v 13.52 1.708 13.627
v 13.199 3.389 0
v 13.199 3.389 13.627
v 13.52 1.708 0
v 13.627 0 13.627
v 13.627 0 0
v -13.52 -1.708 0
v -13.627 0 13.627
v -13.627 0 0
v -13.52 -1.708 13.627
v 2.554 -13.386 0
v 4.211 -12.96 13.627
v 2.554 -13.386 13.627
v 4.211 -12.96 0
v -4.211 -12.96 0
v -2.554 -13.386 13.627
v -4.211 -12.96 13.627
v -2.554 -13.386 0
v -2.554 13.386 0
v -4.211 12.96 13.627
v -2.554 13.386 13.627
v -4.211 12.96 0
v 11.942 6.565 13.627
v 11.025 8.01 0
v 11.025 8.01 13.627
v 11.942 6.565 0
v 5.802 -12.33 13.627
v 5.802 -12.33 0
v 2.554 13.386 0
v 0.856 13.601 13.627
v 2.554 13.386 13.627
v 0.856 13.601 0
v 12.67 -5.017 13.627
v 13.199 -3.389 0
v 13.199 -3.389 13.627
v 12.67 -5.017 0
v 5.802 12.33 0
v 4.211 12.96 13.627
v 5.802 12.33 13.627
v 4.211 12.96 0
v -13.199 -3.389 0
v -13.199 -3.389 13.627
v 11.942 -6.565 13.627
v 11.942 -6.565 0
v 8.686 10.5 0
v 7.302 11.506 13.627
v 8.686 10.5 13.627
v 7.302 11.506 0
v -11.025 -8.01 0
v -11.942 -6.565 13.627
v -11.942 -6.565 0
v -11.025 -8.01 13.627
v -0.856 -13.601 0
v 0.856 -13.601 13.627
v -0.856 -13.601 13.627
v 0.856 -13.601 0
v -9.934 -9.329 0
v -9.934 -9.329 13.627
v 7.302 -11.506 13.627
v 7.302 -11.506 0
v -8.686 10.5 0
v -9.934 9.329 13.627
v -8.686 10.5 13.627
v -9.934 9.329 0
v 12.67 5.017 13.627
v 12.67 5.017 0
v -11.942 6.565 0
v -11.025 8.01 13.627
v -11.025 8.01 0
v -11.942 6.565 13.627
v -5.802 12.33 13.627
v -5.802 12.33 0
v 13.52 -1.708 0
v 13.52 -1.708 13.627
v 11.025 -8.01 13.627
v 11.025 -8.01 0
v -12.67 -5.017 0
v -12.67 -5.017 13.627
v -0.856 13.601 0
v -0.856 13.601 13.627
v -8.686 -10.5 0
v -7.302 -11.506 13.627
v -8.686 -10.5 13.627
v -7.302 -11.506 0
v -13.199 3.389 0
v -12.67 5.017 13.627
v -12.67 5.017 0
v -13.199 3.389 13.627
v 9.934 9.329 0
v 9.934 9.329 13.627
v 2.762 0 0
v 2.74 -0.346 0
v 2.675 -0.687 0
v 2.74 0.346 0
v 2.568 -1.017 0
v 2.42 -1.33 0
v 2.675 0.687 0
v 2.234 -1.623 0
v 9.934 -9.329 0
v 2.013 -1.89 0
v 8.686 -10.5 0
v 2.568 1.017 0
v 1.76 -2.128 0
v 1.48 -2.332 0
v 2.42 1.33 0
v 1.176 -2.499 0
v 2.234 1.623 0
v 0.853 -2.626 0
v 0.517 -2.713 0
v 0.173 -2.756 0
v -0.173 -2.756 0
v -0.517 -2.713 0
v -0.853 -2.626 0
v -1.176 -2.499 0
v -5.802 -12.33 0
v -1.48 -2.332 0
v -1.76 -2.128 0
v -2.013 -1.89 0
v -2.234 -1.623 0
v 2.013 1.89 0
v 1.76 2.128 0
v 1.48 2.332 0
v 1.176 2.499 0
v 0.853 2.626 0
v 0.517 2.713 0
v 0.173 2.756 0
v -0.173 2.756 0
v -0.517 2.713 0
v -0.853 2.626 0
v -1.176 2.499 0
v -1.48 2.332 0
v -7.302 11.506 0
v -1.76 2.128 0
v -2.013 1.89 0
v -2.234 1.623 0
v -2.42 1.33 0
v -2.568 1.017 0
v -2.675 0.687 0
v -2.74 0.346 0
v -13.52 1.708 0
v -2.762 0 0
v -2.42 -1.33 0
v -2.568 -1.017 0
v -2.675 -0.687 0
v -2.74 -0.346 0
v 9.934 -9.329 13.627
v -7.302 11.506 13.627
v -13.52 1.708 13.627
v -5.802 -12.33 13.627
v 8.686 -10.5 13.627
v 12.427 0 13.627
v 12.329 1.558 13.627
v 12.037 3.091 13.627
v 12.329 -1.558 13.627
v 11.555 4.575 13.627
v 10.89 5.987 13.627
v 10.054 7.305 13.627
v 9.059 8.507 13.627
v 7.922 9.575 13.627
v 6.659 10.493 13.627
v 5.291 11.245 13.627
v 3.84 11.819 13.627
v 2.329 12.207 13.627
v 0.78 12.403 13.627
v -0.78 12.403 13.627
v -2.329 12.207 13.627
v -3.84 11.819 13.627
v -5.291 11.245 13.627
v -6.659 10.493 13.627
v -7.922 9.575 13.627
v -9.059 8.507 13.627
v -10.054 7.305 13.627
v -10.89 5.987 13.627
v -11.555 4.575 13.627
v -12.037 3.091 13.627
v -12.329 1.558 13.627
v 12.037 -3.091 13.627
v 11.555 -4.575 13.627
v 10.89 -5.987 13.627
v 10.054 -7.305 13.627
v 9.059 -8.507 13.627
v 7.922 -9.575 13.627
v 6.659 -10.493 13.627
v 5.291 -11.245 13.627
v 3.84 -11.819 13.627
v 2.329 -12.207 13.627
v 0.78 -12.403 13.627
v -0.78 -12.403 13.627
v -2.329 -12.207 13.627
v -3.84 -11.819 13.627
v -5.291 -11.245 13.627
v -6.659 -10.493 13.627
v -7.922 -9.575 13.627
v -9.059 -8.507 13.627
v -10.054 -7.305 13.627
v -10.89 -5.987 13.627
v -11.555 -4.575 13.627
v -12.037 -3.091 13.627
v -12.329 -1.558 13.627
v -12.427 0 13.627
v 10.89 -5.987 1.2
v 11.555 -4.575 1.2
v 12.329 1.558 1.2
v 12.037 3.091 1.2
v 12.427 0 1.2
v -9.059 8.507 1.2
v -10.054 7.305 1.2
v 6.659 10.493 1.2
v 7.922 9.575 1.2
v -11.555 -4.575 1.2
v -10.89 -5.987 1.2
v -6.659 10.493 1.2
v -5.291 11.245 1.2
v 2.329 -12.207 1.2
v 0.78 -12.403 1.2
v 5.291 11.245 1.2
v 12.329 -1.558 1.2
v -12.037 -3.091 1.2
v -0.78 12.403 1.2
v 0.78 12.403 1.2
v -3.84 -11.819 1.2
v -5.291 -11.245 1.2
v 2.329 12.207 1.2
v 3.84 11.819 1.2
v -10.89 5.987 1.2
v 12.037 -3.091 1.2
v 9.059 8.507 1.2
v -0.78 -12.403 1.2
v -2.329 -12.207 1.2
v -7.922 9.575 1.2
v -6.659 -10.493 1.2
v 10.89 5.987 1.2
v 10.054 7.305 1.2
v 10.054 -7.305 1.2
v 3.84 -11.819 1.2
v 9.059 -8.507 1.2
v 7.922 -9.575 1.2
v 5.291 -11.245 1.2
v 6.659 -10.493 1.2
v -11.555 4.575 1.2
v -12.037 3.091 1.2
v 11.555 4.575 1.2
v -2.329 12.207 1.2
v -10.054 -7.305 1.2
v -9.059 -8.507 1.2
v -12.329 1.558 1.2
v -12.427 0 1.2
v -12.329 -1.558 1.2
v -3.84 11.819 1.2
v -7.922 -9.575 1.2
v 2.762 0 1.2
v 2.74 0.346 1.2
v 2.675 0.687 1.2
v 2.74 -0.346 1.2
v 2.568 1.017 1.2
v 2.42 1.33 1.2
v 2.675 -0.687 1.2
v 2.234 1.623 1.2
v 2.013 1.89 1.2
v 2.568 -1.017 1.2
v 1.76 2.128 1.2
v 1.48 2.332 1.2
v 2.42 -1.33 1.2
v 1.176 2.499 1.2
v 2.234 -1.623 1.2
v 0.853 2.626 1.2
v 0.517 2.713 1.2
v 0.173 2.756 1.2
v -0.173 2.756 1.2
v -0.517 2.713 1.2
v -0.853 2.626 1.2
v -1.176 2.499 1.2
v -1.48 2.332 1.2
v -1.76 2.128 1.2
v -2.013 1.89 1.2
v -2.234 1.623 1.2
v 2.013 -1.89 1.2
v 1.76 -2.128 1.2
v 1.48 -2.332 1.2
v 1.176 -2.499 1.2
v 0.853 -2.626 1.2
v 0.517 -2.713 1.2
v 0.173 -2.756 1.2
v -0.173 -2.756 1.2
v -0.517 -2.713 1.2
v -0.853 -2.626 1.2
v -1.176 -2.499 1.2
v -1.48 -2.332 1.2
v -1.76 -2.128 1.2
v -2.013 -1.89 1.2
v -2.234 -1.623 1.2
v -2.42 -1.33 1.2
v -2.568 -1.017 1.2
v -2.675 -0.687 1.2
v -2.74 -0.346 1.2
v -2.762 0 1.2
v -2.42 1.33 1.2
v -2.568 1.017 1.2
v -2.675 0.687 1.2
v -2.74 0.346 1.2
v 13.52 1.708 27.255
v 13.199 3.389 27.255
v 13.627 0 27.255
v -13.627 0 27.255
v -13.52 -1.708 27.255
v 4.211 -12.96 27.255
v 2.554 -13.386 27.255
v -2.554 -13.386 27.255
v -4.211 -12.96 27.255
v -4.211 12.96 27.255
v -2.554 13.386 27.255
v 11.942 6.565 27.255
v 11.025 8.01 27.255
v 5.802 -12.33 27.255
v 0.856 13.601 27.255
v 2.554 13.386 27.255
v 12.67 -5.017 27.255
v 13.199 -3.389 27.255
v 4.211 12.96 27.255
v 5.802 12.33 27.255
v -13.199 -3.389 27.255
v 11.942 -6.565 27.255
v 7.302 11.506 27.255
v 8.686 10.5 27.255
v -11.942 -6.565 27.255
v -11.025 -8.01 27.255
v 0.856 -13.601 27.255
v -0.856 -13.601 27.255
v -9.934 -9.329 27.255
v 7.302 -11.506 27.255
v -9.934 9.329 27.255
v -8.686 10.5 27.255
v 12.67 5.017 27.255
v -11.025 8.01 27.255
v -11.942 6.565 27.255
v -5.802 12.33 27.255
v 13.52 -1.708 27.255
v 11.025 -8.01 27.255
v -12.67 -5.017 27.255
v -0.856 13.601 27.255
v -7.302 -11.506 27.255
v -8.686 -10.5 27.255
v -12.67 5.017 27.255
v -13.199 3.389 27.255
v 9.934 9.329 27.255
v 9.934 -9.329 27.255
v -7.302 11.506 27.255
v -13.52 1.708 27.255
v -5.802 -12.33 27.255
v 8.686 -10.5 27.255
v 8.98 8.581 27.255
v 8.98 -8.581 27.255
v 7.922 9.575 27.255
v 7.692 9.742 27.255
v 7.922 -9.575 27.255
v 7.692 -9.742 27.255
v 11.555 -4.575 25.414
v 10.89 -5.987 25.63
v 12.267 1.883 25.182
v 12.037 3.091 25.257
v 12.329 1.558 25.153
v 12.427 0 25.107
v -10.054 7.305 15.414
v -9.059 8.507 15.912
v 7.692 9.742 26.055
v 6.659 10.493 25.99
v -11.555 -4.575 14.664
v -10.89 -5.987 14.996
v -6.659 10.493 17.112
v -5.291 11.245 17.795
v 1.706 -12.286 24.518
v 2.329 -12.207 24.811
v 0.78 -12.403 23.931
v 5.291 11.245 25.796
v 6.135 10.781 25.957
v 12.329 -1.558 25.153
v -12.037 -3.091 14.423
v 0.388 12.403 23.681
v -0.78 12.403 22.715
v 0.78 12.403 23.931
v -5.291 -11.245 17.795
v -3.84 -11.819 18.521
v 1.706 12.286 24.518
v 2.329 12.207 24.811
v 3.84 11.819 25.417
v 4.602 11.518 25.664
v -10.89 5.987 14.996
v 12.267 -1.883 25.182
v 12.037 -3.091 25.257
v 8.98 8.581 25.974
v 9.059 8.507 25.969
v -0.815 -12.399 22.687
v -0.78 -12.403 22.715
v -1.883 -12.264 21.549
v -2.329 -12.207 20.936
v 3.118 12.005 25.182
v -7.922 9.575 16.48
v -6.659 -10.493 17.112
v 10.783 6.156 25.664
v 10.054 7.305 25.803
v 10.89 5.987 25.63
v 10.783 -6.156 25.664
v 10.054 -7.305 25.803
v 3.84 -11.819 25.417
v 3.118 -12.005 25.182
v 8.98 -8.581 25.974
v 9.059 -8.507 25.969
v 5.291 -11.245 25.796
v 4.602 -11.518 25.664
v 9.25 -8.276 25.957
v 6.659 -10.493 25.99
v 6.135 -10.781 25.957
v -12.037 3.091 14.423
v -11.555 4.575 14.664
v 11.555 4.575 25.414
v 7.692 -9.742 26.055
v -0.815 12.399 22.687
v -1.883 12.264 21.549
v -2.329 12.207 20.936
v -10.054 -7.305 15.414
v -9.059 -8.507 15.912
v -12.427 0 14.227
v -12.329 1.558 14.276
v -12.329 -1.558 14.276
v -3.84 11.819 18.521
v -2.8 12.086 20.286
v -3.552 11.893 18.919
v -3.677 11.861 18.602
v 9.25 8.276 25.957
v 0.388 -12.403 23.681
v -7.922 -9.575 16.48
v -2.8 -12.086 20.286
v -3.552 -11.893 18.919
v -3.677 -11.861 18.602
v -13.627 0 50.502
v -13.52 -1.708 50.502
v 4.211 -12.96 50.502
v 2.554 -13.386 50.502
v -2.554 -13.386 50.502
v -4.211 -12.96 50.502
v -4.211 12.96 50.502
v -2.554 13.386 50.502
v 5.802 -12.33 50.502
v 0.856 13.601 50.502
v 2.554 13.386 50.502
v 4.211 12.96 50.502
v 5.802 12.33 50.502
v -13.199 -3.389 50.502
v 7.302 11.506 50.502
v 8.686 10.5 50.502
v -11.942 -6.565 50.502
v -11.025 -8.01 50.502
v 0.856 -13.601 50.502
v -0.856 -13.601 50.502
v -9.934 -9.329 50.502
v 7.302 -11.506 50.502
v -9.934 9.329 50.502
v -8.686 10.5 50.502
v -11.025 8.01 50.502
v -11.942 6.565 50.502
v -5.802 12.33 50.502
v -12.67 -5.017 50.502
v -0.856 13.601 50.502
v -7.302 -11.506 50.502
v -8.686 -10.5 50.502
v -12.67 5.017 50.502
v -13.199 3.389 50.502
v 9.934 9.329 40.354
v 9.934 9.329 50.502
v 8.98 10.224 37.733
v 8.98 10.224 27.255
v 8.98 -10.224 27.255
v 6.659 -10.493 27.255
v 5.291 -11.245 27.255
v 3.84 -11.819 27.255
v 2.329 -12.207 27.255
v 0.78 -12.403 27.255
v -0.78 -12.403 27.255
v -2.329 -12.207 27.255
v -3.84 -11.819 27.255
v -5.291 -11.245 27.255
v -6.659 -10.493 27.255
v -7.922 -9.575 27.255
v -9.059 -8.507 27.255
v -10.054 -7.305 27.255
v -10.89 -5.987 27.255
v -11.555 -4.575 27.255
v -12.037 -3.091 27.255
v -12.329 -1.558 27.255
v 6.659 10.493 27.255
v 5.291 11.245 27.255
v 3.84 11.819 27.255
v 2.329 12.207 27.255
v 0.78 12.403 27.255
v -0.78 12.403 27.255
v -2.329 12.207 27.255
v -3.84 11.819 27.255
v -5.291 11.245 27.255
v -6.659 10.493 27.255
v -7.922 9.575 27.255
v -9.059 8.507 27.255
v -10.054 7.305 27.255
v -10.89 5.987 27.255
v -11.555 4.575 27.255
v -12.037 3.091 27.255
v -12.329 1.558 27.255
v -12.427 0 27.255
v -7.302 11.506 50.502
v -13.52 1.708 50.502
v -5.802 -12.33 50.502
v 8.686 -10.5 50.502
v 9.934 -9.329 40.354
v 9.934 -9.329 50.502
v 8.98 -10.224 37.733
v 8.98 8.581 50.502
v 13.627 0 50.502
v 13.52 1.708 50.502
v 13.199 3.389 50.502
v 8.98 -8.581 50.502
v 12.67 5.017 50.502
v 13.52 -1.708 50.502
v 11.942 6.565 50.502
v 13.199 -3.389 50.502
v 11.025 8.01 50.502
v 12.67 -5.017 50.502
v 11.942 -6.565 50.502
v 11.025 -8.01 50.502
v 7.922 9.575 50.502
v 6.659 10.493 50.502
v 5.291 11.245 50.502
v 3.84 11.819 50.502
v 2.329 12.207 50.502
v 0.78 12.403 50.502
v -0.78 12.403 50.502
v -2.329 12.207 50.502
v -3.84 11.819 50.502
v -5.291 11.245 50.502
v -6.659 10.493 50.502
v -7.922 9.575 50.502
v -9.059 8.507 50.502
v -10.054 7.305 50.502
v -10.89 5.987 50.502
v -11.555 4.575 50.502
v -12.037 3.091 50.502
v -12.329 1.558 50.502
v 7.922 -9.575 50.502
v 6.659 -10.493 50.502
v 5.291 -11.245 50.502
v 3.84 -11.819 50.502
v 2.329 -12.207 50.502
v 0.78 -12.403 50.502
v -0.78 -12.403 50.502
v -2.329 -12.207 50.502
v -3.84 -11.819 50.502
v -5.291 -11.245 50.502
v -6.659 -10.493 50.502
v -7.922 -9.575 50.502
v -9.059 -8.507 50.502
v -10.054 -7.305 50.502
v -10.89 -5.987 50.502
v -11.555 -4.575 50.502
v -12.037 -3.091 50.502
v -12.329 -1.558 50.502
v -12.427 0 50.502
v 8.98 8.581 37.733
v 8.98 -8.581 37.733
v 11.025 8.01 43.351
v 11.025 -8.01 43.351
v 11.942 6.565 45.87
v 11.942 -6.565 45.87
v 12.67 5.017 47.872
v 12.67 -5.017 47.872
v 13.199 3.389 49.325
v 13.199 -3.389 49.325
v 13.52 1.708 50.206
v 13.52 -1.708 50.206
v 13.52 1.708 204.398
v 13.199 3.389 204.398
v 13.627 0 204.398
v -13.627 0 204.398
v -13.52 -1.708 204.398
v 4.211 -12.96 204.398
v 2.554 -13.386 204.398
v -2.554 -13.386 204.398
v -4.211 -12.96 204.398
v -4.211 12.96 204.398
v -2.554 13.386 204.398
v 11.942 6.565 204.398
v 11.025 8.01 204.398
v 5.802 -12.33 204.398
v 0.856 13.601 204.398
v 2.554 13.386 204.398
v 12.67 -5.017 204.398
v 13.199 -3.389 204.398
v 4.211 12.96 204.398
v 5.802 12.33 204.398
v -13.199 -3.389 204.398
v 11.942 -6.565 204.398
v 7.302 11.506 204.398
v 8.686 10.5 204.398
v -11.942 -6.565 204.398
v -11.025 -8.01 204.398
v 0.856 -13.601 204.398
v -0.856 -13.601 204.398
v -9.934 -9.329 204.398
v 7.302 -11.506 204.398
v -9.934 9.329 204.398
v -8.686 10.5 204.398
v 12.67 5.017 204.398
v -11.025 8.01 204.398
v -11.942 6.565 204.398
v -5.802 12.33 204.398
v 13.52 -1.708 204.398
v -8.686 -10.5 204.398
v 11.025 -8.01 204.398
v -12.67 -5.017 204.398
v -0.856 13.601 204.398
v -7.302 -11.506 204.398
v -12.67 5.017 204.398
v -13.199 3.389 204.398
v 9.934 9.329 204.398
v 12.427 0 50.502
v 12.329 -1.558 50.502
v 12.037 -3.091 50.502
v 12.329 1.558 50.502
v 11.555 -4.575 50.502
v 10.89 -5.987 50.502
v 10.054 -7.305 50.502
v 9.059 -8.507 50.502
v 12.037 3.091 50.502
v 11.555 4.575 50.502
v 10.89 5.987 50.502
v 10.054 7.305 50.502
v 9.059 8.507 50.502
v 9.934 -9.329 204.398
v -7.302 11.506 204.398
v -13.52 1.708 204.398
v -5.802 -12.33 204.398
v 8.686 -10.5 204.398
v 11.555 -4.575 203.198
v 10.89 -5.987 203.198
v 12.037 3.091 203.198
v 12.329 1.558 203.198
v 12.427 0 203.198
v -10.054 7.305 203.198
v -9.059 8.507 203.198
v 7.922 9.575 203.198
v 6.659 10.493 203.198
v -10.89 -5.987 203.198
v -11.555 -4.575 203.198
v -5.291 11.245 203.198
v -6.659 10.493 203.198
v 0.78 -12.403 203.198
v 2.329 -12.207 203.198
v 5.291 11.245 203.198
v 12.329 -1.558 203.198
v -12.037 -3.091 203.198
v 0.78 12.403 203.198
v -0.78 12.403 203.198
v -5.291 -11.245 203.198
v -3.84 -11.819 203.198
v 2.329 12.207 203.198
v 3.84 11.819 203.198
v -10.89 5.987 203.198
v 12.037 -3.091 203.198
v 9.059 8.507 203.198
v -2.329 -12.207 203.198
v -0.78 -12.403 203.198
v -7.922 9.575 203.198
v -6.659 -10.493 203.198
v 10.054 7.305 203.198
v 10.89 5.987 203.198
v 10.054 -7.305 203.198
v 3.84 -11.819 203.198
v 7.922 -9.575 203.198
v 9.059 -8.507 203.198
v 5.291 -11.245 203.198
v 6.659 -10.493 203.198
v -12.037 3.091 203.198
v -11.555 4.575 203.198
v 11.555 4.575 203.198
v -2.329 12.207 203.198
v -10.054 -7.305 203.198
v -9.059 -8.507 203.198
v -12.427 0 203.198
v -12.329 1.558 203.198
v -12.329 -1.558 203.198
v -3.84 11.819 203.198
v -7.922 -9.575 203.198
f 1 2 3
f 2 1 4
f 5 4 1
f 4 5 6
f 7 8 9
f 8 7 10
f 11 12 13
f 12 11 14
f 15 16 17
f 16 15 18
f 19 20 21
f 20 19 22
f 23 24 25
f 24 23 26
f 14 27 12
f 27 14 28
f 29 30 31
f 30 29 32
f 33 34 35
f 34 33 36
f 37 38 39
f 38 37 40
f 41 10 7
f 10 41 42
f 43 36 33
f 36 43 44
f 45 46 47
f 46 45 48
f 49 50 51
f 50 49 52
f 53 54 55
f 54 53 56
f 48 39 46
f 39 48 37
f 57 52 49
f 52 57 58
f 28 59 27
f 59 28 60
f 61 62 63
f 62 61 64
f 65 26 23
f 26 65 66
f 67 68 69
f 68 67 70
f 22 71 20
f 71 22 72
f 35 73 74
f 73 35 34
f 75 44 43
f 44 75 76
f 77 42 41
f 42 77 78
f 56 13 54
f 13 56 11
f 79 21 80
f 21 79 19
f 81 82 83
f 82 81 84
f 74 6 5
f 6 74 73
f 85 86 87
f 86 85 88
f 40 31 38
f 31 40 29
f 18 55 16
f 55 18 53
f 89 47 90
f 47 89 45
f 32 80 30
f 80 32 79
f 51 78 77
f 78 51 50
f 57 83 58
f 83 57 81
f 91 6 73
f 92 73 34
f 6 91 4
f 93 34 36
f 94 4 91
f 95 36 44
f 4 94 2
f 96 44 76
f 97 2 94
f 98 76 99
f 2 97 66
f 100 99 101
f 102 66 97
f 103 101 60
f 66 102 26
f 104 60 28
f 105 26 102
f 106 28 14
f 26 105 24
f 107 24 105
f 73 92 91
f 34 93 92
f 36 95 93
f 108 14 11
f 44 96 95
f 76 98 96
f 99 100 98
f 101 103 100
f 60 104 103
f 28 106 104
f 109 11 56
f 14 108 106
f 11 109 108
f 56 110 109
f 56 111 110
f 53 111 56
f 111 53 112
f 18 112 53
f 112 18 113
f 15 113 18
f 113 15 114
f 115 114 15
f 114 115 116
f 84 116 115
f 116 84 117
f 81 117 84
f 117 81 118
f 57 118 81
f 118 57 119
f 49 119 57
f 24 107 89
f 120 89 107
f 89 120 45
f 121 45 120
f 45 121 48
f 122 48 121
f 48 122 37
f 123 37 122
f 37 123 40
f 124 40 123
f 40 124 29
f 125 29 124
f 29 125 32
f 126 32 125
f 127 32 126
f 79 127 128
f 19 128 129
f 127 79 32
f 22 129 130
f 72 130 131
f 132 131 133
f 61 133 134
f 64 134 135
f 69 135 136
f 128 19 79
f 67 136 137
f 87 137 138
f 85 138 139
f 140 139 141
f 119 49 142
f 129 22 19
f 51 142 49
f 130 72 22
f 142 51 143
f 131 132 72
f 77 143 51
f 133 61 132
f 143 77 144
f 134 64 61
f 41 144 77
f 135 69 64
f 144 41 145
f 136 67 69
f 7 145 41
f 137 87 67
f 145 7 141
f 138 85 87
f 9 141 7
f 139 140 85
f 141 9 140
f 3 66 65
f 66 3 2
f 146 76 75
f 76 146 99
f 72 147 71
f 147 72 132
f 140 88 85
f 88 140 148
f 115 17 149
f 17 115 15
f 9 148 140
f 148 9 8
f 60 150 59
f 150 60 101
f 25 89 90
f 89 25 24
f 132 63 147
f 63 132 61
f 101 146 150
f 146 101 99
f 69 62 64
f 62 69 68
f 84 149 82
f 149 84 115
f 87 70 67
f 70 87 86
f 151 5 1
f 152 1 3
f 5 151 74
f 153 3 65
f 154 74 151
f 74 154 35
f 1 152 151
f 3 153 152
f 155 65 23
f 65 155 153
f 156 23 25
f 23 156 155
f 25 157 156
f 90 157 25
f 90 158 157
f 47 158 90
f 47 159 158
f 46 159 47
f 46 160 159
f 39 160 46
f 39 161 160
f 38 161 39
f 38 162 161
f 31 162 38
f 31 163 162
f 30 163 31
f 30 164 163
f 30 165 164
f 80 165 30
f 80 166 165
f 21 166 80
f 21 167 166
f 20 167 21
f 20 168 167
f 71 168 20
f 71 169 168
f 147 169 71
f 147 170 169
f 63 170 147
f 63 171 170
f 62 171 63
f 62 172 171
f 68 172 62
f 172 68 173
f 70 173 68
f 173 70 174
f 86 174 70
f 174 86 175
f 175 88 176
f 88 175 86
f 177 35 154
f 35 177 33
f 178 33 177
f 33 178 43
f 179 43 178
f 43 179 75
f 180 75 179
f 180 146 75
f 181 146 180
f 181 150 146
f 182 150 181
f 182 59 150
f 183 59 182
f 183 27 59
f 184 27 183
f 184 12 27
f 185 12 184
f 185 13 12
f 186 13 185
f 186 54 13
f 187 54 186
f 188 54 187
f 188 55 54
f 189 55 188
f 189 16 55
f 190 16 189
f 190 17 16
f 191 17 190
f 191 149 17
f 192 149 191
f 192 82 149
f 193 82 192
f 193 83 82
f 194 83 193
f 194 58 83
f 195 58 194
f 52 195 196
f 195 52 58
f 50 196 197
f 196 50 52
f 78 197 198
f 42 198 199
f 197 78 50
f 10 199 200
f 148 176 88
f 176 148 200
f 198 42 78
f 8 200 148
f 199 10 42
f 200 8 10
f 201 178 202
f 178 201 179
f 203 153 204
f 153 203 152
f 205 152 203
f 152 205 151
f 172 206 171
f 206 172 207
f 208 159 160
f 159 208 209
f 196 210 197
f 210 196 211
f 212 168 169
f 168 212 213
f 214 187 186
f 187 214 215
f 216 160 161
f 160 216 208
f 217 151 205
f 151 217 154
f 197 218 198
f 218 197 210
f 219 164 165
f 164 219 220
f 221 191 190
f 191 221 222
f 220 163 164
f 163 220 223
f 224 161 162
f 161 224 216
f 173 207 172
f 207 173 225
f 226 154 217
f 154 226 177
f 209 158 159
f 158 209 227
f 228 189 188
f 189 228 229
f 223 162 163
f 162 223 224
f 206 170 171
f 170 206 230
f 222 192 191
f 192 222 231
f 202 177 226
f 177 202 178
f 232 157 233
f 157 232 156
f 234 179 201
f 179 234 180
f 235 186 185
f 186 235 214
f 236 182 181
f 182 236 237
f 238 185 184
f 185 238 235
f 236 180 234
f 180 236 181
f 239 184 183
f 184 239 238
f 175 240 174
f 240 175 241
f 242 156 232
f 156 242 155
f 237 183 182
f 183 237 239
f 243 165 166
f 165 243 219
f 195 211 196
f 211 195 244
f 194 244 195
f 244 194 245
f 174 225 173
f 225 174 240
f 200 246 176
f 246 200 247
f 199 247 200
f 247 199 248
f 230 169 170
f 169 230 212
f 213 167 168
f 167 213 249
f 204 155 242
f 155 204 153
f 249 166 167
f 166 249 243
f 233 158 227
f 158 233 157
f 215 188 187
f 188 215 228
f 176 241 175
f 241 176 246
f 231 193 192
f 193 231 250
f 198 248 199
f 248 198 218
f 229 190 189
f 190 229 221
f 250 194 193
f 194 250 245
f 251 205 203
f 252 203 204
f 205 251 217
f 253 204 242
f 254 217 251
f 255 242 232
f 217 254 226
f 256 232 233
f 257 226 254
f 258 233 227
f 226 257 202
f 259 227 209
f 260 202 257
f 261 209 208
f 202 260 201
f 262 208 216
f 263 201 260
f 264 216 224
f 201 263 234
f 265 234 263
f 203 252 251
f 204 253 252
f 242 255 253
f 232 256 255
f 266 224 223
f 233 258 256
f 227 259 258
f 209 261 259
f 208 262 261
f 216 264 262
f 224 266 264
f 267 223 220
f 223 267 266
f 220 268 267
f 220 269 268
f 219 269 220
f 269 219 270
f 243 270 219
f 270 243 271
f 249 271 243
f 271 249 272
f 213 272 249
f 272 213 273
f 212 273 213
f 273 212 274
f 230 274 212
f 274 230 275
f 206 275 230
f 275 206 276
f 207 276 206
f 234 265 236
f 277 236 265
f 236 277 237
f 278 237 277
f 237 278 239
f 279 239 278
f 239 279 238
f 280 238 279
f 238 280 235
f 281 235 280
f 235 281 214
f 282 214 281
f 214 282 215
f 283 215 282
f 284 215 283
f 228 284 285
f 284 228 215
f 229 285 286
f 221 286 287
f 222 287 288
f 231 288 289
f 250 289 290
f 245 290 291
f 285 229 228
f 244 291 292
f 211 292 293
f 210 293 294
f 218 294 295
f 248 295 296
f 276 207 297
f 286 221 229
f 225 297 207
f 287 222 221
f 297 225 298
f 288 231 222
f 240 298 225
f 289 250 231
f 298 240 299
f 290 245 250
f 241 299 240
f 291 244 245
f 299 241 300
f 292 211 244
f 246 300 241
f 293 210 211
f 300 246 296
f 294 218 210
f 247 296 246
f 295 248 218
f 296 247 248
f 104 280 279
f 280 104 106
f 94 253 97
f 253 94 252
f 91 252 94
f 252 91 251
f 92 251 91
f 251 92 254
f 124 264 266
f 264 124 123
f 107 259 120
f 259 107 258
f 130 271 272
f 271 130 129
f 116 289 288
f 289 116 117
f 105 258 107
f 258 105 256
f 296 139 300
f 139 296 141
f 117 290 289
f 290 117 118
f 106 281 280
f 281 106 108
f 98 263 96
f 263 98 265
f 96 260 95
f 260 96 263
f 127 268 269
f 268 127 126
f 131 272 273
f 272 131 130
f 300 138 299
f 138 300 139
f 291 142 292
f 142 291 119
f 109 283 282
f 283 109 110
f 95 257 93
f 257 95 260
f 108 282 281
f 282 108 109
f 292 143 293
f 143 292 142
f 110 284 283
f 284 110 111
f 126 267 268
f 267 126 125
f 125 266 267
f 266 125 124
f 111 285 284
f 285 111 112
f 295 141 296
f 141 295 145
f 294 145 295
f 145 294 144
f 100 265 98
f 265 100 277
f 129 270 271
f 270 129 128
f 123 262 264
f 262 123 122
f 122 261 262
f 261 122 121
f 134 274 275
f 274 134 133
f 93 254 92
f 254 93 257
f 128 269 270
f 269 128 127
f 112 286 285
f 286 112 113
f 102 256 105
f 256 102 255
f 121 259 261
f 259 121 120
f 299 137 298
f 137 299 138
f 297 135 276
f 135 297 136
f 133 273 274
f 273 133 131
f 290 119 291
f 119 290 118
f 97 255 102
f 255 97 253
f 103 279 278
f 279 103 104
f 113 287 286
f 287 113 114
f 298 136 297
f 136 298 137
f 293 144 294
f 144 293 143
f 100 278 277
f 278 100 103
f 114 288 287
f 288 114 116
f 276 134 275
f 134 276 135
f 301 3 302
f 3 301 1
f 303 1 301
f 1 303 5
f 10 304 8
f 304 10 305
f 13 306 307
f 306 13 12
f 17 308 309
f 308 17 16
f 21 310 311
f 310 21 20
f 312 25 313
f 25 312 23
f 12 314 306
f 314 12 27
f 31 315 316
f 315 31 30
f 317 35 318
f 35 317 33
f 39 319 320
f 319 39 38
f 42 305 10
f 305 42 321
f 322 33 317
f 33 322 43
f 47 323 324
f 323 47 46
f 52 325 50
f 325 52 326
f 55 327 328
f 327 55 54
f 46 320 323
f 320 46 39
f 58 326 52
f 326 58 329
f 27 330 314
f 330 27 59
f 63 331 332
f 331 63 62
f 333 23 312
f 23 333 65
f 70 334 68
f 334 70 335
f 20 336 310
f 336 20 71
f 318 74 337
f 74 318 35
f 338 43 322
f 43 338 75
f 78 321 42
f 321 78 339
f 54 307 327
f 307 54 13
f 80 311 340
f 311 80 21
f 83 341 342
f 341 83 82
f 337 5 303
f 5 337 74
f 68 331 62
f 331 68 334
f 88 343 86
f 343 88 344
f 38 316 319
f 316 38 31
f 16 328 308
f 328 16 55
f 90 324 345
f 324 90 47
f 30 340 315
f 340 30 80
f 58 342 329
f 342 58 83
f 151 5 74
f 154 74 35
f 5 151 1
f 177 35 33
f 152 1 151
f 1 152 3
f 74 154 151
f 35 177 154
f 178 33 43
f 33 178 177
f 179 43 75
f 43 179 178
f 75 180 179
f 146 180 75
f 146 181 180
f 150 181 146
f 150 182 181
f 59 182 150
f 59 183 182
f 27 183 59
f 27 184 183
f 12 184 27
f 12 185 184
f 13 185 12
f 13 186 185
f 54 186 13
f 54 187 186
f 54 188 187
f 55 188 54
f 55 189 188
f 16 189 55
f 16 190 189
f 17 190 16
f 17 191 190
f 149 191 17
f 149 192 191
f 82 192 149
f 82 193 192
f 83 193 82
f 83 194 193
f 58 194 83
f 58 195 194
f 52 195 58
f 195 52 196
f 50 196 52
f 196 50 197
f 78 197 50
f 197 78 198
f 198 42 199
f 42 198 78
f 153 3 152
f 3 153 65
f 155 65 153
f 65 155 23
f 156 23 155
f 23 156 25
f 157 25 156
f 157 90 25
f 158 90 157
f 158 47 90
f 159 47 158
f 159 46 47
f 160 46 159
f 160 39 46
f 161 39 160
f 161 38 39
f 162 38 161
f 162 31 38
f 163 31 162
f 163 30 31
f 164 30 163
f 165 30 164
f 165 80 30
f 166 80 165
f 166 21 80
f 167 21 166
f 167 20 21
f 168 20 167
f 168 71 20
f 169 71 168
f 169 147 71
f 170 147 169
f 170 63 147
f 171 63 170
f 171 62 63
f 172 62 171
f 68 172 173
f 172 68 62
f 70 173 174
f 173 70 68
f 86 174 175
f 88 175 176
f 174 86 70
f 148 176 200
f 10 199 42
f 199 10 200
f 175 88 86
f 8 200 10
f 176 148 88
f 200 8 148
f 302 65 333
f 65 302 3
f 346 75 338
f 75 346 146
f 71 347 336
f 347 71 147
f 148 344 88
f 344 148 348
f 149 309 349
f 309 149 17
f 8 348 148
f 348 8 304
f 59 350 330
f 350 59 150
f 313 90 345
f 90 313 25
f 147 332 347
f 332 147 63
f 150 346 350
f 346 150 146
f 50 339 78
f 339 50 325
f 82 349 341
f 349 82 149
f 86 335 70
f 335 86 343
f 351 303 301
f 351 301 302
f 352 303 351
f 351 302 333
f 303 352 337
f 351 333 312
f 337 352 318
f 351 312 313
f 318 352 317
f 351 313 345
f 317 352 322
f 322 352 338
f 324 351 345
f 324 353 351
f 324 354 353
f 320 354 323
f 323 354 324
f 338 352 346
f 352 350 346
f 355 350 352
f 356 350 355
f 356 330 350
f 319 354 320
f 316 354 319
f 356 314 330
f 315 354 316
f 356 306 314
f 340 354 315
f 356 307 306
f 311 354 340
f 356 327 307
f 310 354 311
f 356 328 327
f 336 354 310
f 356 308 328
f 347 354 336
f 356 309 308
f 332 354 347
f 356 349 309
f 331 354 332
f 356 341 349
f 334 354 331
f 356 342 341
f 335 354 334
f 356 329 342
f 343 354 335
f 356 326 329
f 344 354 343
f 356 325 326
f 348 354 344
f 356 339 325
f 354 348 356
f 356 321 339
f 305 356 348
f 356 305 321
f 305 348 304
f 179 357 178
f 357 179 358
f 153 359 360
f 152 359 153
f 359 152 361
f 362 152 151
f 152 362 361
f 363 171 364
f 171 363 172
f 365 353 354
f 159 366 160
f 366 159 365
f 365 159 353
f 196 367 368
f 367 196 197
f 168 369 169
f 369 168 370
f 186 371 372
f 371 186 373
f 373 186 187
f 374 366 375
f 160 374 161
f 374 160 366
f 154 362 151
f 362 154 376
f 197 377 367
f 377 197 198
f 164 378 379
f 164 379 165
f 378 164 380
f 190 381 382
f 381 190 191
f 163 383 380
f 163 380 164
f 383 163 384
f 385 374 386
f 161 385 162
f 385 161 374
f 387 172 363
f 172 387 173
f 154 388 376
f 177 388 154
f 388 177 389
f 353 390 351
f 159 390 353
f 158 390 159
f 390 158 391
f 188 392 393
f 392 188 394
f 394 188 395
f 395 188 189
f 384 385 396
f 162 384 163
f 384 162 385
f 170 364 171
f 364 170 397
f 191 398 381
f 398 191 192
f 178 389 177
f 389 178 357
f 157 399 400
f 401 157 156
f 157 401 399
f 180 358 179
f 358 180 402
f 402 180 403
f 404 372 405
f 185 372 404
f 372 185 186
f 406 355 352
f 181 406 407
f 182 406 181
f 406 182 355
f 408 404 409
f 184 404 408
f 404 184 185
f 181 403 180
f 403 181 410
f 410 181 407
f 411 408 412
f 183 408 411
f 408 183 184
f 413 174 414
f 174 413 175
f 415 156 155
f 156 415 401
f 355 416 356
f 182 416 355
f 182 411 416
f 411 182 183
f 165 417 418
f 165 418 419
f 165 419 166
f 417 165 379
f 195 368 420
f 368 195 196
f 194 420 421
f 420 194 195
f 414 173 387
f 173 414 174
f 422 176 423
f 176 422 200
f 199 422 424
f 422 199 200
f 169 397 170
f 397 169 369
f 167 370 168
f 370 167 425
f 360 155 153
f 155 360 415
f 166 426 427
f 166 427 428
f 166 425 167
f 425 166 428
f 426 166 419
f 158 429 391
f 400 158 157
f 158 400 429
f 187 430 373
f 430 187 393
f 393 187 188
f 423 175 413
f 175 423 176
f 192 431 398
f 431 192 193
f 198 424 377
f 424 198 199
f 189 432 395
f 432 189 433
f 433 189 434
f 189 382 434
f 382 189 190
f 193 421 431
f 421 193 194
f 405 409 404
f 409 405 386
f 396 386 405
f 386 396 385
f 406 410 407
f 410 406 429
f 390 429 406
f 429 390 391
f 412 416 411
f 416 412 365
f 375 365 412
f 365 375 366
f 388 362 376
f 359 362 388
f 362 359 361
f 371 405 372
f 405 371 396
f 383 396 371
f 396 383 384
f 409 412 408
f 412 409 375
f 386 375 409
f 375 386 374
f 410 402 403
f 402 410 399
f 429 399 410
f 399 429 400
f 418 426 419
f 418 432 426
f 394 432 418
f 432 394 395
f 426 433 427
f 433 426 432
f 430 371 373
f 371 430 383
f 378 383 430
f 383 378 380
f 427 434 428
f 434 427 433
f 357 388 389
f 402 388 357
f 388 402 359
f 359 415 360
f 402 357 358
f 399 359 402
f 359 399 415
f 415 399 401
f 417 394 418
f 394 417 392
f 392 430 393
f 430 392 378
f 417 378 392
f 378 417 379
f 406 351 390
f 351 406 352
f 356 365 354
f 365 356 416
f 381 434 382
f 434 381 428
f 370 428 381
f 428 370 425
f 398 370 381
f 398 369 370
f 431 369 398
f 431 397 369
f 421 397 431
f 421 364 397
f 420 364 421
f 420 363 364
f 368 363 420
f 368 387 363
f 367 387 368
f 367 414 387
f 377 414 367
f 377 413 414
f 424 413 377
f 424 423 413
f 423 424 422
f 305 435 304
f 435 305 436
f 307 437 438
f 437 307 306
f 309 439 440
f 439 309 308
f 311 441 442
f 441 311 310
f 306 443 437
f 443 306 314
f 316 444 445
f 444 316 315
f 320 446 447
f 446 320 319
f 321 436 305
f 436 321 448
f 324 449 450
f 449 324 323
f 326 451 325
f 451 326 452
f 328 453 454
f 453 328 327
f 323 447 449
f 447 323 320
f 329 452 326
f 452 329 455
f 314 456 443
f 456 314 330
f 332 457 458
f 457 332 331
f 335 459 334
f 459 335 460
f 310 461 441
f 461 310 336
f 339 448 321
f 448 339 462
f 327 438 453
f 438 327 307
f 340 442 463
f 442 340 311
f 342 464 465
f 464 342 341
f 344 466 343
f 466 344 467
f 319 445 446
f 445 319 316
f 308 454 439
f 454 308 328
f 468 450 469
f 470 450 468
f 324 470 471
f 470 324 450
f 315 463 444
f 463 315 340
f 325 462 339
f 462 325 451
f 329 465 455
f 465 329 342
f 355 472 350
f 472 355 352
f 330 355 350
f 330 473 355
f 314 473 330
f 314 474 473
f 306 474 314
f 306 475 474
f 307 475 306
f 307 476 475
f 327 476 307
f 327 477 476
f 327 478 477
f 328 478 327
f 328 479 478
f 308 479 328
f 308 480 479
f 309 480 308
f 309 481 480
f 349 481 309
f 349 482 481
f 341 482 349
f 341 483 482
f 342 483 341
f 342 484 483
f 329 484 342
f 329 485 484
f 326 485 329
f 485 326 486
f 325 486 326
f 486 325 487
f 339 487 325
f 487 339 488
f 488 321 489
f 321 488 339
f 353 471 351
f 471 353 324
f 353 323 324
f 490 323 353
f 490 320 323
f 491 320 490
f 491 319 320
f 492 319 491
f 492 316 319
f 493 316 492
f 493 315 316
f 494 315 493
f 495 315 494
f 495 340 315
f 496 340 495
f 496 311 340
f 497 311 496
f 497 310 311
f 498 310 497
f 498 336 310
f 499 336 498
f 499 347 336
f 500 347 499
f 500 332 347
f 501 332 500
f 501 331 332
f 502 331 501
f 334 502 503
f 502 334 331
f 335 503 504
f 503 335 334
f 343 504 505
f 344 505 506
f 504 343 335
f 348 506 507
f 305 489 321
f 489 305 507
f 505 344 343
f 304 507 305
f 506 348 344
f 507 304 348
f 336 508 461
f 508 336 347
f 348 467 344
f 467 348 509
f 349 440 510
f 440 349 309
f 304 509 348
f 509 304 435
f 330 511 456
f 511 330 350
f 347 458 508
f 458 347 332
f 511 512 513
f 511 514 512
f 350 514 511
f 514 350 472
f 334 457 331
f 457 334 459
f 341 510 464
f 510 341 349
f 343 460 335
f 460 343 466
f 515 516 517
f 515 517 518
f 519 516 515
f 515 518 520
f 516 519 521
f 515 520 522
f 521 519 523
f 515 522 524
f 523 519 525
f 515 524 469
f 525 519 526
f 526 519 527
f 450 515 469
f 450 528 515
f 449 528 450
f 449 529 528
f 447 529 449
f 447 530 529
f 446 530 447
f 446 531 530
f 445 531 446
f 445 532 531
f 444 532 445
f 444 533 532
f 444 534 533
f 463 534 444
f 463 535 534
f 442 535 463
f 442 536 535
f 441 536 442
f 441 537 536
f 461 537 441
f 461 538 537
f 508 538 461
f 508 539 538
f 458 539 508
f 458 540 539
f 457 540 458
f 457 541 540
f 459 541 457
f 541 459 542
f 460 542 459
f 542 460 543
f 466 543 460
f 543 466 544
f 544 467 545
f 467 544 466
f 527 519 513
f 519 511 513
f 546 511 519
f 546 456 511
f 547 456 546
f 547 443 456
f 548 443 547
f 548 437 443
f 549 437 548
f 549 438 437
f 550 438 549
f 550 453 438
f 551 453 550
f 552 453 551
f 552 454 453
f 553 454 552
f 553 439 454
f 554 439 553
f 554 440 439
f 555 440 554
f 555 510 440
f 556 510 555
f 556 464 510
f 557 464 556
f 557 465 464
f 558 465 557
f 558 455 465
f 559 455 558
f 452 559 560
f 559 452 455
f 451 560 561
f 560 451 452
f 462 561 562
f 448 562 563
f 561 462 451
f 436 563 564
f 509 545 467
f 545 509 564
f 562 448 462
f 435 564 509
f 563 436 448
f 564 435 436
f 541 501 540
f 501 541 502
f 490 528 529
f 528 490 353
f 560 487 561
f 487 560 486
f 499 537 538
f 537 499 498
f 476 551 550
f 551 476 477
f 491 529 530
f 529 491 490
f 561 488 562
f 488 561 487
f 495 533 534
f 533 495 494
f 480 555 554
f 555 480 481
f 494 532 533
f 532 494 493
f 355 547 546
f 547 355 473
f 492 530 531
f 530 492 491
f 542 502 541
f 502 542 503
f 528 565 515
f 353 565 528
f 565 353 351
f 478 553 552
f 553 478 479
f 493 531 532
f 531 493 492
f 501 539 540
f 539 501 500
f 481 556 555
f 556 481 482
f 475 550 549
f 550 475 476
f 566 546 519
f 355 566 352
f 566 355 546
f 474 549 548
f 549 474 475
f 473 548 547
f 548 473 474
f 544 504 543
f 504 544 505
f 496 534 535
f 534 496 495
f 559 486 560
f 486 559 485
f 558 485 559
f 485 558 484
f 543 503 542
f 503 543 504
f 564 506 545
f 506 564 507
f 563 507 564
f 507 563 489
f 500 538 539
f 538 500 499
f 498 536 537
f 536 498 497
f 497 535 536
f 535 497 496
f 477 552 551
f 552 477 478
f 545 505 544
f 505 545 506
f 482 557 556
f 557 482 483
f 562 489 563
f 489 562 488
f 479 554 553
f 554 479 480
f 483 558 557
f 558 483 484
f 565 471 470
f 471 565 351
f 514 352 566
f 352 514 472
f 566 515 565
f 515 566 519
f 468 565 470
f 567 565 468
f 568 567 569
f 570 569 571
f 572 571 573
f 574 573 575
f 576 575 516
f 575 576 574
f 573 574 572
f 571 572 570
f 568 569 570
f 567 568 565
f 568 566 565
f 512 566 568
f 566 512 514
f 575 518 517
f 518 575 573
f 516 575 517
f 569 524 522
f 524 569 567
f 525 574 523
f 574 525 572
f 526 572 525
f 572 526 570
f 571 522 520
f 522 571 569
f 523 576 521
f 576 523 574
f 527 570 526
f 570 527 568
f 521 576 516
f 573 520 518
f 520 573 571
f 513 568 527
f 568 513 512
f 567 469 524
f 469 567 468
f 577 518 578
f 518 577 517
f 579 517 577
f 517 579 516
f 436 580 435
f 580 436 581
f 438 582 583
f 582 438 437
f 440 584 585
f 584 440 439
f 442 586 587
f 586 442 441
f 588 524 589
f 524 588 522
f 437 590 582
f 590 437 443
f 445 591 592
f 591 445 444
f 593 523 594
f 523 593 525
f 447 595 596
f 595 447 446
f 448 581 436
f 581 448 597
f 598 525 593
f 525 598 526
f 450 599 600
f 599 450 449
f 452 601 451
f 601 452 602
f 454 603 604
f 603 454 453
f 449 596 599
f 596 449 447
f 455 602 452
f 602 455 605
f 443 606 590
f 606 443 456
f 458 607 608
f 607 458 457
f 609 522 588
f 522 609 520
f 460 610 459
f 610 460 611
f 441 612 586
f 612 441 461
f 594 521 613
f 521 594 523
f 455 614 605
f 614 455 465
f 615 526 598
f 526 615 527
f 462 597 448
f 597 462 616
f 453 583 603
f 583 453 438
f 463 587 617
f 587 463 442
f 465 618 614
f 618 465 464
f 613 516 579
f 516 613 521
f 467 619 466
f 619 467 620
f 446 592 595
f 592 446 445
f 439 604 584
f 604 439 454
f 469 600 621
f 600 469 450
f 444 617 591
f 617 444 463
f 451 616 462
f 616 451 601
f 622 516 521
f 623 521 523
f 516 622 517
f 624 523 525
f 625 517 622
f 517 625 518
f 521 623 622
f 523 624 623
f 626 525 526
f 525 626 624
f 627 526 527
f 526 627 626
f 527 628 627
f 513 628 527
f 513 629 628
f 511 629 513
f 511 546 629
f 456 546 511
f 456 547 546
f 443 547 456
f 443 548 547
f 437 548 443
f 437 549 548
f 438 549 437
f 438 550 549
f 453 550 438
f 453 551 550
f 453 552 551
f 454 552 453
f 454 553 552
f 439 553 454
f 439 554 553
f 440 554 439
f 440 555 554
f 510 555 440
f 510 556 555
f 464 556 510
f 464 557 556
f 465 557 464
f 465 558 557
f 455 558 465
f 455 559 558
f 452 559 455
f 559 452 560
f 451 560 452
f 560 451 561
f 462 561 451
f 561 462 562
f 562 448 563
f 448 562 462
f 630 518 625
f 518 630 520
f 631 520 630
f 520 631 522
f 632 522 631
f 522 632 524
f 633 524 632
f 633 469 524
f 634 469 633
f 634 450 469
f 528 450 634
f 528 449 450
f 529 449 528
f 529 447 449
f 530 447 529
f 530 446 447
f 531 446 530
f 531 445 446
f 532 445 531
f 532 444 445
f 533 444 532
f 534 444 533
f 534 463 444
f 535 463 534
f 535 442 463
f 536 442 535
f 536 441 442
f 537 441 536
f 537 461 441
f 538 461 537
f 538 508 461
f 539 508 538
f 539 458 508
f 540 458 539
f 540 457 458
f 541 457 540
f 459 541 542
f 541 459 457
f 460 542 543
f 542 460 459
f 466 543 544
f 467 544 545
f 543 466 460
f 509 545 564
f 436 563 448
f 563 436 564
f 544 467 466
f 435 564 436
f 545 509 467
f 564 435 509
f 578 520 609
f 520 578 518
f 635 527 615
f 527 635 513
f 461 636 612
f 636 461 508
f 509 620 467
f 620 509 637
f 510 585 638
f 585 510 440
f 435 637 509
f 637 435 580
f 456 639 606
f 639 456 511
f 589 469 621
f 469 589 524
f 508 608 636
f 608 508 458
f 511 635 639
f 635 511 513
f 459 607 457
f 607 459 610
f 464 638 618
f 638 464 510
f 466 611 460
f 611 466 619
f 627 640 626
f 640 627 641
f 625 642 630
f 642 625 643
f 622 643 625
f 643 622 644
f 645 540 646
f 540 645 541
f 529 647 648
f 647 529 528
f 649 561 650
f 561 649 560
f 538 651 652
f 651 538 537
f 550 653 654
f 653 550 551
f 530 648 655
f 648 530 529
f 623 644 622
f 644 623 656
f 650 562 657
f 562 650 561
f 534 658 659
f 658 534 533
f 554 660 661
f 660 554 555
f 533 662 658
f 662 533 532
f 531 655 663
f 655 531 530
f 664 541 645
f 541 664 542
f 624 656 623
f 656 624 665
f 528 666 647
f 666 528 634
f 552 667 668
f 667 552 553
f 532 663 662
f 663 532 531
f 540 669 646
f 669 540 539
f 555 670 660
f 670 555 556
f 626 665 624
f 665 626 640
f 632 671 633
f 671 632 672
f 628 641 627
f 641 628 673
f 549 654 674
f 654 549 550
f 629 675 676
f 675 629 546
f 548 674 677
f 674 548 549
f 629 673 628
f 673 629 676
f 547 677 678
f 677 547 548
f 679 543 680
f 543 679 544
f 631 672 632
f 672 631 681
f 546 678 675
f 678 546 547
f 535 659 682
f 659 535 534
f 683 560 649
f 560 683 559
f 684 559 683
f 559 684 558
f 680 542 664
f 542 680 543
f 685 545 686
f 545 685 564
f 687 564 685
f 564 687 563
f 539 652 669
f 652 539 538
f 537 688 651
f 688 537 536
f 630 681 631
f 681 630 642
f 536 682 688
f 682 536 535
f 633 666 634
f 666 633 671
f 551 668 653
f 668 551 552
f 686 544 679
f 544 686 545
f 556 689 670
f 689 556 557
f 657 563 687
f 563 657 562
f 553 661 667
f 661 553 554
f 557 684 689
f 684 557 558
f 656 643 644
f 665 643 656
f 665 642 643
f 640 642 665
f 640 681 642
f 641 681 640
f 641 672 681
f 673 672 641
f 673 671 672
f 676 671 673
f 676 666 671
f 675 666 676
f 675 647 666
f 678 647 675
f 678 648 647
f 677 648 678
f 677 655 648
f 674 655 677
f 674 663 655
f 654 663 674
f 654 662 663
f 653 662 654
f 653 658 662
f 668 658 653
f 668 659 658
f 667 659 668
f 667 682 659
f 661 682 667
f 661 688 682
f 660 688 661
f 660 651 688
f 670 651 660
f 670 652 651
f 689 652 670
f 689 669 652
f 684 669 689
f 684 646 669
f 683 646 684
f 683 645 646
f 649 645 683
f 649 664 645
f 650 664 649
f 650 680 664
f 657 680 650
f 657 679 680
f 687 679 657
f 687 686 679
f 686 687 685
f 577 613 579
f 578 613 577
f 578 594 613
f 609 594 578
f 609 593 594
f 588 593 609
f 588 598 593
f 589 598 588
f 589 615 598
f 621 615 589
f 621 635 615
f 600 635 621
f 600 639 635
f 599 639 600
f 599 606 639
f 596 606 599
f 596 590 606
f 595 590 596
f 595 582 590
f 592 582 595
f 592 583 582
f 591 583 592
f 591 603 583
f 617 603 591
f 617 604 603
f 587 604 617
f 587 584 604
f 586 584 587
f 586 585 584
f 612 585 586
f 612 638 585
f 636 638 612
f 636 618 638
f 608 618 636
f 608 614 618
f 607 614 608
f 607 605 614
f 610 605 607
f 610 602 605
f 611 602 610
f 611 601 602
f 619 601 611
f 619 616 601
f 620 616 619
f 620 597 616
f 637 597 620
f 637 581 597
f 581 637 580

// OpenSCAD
//Parameters

//All dimensions in mm
//Frequency is in Hz
//Assuming pressure of 2 in. H20


f = 440;
scaling_formula= 25.4*(56.5924582042675*pow(f,-0.666621066467016)); //Scaling formula for Bourdon pipes

Pressure = 2; //inches of water, pressure
Cap = 1; //1=yes, 2=no




//Intermediate variables



ID = scaling_formula;
echo(ID);


Lip_angle = 20;

IW = (3.14159*ID)/4;

Wall_thickness = 1.2;

//Formula for PL based on Liljencrants numbers
Pipe_length= Cap*((86004.4/f)-IW);

//Formula for MH based on Giangiulio's equation
openMHformula = 550/(pow(2,(ln (f))));
closedMHformula = pow((3.018-(0.233*(ln (f)))),5);

Mouth_height = (Cap-1)*(openMHformula)+(-1*(Cap-2))*(closedMHformula);

//Formula for WST based on Ising's #
WST = 25.4*(((4.8*(pow(f,2))*(pow(Mouth_height/25.4,3)))/Pressure)*1.554*pow(10,-6));

echo(WST);
echo(Mouth_height);

Foot_hole_radius = ID/9;
Foot_wall = Wall_thickness;


OD = ID+(2*Wall_thickness);
SU = OD/2;  //SU is standard arbitrary unit equal to outer radius


prism_width = OD;

windsheet_displacement = sqrt(((ID*ID)-(IW*IW))/4);

prism_thickness = SU-(WST+windsheet_displacement);

prism_height = (prism_thickness*sin(90-Lip_angle))/(sin(Lip_angle))  ;

Mouth_cylinder_height = prism_height+Mouth_height;

resonator_length = Pipe_length - Mouth_cylinder_height;


foot_vert_disp = 0;
collar_vert_disp = SU;
languid_vert_disp = SU;
mouth_vert_disp = 2*SU;
resonator_vert_disp = 2*SU + Mouth_cylinder_height;
cap_vert_disp = resonator_vert_disp + resonator_length;

languid_thickness = Wall_thickness ;







//Prism module
 module prism(l, w, h){
       polyhedron(
               points=[[0,0,0], [l,0,0], [l,w,0], [0,w,0], [0,w,h], [l,w,h]],
               faces=[[0,1,2,3],[5,4,3,2],[0,4,5,1],[0,3,4],[5,2,1]]
               );
       
       }





//foot of pipe
difference(){
    cylinder(h=SU, r1=SU, r2=SU, center=false,$fn=50);
    cylinder(h=SU,r1=SU-Wall_thickness,r2=SU-Wall_thickness, center=false,$fn=50);
}

//Hole in foot of pipe
difference(){
    cylinder(h=Wall_thickness, r1=SU, r2=SU, center = false, $fn=50);
    cylinder(h=Wall_thickness*2,r1=Foot_hole_radius, r2= Foot_hole_radius, center = false, $fn=50);
}

//wall above foot
translate ([0,0,collar_vert_disp])
    difference(){
        cylinder(h=SU,r1=SU,r2=SU, center =false,$fn=50);
        cylinder(h=SU, r1=SU-Wall_thickness, r2=SU-Wall_thickness,center=false,$fn=50);
    }

//languid
translate([0,0,languid_vert_disp]){
    difference(){
        difference(){   
            difference(){

                cylinder (h=SU,r1=SU,r2=SU,center=false,$fn=50);
                
                rotate ([270,270,0]){
                    translate ([0,windsheet_displacement,0])
                        cylinder (h=2*SU,r1=SU-languid_thickness,r2=SU-languid_thickness,center=true,$fn=50);
                }
            }
            
            translate ([windsheet_displacement,-SU,0])
                cube ([WST,2*SU,SU]);
        }
        
        rotate([270,0,90]){
            translate([-SU,-SU/2,0])
                prism(SU*2,SU/2,SU);
        }
    }
}

//Mouth
translate([0,0,mouth_vert_disp]){
    difference(){
        difference(){
            cylinder(h=Mouth_cylinder_height, r1=SU, r2=SU, center=false,$fn=50);
            cylinder(h=Mouth_cylinder_height,r1=SU-Wall_thickness,r2=SU-Wall_thickness, center=false,$fn=50);
        }
        
       translate([windsheet_displacement+WST,-SU,0])
            cube([SU,SU*2,Mouth_cylinder_height]);
    }
    intersection(){
        translate([windsheet_displacement+WST,-SU,Mouth_height])
            rotate([90,0,90])
                prism(prism_width,prism_height,prism_thickness);
        
        cylinder(h=SU*12,r1=SU,r2=SU, center = false,$fn=50);
        
        }
        
}



//Resonant length    
translate ([0,0,resonator_vert_disp])
    difference(){
        cylinder(h=resonator_length,r1=SU,r2=SU, center =false,$fn=50);
        cylinder(h=resonator_length, r1=SU-Wall_thickness, r2=SU-Wall_thickness,center=false,$fn=50);
   }
    
//Cap
if (Cap==1){
    translate([0,0,cap_vert_disp])
        cylinder(h=languid_thickness,r1=SU,r2=SU, center=false, $fn=50);
}


//ID = 24.84344;
//WST = 0.9398; //for A440
//Empirical formula for Bourdon WST = 0.4121588269*(pow(f,-0.3961763730))*25.4;
